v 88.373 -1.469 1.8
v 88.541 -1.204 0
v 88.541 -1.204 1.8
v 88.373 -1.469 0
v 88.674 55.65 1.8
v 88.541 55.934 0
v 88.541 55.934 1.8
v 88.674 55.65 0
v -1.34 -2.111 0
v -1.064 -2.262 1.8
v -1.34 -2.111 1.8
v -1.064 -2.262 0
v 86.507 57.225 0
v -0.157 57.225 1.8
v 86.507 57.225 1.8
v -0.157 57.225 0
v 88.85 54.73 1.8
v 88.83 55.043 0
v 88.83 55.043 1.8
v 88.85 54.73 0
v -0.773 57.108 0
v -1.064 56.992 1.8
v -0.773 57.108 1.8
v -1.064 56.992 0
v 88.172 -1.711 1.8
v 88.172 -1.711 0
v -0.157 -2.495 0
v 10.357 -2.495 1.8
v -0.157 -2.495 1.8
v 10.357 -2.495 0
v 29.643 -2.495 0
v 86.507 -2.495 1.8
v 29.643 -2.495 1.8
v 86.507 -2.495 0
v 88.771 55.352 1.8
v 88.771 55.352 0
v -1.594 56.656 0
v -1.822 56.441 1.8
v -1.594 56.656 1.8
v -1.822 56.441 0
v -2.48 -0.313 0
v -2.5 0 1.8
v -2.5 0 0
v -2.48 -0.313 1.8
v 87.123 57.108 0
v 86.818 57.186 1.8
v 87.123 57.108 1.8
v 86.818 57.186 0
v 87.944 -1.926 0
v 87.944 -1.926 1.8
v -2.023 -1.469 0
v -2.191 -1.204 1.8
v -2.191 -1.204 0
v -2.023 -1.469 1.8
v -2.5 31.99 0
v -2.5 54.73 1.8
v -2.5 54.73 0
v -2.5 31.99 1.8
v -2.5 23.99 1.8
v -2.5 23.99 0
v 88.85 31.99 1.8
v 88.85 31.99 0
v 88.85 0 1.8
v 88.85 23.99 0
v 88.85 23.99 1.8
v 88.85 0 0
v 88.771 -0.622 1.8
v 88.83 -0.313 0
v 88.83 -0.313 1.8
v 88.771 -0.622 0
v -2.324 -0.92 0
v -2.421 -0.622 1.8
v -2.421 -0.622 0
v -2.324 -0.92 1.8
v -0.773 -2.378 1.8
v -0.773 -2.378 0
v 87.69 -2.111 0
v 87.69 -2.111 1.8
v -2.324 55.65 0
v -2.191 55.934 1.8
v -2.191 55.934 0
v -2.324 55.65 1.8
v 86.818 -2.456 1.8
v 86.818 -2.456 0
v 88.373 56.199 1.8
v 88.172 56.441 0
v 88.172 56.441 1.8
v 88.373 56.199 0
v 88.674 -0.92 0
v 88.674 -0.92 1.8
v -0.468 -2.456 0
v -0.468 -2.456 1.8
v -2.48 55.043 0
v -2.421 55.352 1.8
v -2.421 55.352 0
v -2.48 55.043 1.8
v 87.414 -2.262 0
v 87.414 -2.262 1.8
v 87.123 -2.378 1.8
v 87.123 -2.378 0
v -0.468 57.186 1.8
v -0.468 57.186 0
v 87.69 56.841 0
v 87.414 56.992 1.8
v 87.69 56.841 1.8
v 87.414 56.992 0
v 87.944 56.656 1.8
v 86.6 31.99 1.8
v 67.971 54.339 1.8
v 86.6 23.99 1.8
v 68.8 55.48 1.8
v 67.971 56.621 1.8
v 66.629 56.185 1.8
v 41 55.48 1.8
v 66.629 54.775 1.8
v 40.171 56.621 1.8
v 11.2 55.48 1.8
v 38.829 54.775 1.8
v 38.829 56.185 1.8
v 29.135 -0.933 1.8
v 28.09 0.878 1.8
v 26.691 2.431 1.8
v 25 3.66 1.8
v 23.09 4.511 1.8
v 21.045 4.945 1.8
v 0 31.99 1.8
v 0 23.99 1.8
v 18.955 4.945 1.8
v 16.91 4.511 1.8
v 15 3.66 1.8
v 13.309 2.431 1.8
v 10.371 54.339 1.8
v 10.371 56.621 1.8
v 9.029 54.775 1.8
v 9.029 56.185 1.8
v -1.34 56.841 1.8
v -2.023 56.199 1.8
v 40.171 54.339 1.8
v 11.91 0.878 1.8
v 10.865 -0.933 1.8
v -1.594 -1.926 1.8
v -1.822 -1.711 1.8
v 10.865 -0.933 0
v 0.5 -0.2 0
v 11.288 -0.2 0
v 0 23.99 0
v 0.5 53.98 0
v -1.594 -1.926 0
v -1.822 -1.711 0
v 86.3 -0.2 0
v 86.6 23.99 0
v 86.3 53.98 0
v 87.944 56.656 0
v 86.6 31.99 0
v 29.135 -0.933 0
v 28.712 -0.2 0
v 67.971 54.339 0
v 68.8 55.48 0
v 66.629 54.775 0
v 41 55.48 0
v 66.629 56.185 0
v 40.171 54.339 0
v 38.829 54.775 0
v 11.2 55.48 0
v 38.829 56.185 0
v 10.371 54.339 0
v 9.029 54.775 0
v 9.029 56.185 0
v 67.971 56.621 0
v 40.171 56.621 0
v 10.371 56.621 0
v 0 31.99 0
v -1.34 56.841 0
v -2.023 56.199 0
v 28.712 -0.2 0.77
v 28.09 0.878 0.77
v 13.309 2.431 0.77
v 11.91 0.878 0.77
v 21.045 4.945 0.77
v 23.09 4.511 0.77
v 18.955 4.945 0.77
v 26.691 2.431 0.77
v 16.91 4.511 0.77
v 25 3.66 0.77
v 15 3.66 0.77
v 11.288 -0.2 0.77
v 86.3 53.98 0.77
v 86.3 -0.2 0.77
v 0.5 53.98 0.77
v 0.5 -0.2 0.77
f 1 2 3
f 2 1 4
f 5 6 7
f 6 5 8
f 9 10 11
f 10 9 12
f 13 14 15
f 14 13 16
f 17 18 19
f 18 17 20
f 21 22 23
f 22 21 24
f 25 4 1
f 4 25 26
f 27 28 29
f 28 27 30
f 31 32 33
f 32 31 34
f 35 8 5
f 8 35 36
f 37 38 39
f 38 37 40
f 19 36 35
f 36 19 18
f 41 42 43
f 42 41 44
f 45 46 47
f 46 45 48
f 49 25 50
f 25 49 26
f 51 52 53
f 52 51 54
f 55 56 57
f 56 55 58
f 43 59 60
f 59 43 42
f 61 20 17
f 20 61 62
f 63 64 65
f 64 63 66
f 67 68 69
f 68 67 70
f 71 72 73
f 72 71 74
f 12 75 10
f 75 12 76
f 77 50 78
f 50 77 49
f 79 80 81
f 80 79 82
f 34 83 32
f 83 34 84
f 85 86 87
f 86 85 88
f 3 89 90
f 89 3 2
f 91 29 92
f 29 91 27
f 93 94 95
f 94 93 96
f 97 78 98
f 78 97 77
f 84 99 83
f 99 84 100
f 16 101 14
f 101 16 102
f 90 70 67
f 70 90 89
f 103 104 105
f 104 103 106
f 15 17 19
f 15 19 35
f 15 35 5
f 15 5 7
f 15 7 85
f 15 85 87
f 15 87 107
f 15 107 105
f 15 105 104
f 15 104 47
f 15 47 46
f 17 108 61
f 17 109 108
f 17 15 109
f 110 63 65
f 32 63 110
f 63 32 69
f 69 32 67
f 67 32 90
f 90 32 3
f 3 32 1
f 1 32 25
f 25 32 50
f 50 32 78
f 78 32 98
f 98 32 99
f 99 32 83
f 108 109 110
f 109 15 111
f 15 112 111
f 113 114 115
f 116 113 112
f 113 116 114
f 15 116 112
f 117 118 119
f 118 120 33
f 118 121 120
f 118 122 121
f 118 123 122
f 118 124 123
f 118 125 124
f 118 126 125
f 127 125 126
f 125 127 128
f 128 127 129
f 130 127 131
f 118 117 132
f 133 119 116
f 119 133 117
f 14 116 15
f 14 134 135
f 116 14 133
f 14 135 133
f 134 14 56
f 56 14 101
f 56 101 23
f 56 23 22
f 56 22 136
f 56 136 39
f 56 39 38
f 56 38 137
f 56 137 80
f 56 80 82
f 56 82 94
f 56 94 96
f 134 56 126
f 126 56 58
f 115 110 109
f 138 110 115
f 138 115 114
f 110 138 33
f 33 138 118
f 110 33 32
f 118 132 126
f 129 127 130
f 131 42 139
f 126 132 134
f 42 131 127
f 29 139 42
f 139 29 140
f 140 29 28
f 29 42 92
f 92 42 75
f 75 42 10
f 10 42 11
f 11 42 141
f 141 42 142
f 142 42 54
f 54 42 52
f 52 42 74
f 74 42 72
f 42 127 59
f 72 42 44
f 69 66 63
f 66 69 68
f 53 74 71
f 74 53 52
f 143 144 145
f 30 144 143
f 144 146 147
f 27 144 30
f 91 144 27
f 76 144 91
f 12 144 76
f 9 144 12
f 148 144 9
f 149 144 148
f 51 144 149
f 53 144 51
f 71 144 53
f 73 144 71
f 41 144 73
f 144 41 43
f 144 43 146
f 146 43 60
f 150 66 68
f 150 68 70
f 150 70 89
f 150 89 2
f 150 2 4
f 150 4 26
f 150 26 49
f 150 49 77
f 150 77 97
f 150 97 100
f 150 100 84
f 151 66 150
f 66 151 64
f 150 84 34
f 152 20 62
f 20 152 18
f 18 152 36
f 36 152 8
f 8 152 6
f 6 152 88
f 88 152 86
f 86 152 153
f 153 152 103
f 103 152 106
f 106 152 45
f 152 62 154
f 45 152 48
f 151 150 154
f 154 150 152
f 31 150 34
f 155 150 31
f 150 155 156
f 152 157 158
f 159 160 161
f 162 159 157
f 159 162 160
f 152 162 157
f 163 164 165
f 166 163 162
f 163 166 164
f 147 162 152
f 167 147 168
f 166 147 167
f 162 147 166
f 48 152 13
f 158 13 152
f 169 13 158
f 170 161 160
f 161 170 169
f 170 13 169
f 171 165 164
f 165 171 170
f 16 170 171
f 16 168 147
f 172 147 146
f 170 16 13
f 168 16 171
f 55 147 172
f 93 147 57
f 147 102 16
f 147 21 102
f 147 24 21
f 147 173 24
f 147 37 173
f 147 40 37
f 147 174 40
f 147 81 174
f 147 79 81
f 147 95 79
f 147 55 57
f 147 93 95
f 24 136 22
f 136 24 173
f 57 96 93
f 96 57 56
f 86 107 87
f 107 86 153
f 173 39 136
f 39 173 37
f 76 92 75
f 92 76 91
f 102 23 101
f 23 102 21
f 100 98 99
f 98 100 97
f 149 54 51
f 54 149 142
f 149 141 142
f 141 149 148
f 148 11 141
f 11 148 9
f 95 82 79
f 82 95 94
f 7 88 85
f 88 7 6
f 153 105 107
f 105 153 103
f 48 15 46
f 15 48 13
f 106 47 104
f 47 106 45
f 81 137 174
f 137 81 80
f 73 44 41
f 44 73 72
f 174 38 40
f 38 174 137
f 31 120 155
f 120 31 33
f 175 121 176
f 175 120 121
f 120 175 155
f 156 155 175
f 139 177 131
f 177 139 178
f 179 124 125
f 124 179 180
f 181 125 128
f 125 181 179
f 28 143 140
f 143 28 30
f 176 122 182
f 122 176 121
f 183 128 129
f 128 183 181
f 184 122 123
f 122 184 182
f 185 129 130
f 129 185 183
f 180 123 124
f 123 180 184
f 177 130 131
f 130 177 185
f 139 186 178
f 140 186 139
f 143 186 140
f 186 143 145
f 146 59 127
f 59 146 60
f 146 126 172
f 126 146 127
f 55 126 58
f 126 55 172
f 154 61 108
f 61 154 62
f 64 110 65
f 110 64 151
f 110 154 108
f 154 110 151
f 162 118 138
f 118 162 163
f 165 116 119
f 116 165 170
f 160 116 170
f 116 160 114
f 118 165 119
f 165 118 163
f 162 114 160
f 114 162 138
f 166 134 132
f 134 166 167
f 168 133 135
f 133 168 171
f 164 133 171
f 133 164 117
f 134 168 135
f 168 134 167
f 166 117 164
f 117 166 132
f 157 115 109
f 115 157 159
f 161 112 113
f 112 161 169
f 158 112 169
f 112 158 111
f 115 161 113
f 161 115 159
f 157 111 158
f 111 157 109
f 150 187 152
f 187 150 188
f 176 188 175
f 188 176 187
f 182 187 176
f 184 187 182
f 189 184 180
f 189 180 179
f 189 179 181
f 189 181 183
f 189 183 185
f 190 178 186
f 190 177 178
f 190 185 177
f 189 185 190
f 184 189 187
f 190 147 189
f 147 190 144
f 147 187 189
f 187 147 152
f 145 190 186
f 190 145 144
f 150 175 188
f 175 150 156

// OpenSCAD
margin = 2;
//
cutOutDepth = margin;
// Gummi Breite
rubberWidth = 8;

notchR = 10;
notchDepth = margin*1.5;

// Kreditkarte
// 85,60 mm × 53,98mm x 0,762 mm (exakt 0,03 Zoll)
cardLength = 85.6 + margin;
cardWidth =  53.98 + margin;
cardHeight = 0.8;

// Module miniround 
module miniround(size, radius) {
	$fn = 50;
	x = size[0]-radius/2;
	y = size[1]-radius/2;

	minkowski() {
		cube(size=[x,y,size[2]]);
		cylinder(r=radius);
	}
}

// Card basic
module card(){
	 miniround([cardLength,cardWidth,cardHeight], 2.5);
}

// card mit zwei gummi cut outs an Längsseite  
module cardFourCutOuts() {
	difference() {
		card();
	// cut out notch at bottom for pushing cards out
		translate([20, -5, -2])
			cylinder(r=notchR, h=cardHeight+4);
		
		// Cut out for rubber 
		translate([0, (cardWidth/2)-rubberWidth/2, -2]) 
 			rotate(90)
			cube([rubberWidth, cutOutDepth+1, 5]);
		// Cut out for rubber
		translate([cardLength+2, (cardWidth/2)-rubberWidth/2, -2])
			rotate(90)
			cube([rubberWidth, cutOutDepth+1, 5]);
    
 		translate([(cardLength/2-rubberWidth/2), cardWidth-0.5, -2]) 
			cylinder(r=1.2, h=cardHeight+4);
		translate([10, cardWidth-0.5, -2]) 
			cylinder(r=1.2, h=cardHeight+4);
 		translate([(cardLength-20), cardWidth-0.5, -2]) 
			cylinder(r=1.2, h=cardHeight+4);
		// Money / RFID Cad outcut
		translate([0.5,-0.2,0])
			cube([85.6+0.2, 53.98+0.2, 0.77]);
		
	}
}

// mini pocket card wallet
cardFourCutOuts();
//difference() {
//	cardFourCutOuts();
//	translate(20,0,0) 
//		cylinder(r=5, h=2);
//}
